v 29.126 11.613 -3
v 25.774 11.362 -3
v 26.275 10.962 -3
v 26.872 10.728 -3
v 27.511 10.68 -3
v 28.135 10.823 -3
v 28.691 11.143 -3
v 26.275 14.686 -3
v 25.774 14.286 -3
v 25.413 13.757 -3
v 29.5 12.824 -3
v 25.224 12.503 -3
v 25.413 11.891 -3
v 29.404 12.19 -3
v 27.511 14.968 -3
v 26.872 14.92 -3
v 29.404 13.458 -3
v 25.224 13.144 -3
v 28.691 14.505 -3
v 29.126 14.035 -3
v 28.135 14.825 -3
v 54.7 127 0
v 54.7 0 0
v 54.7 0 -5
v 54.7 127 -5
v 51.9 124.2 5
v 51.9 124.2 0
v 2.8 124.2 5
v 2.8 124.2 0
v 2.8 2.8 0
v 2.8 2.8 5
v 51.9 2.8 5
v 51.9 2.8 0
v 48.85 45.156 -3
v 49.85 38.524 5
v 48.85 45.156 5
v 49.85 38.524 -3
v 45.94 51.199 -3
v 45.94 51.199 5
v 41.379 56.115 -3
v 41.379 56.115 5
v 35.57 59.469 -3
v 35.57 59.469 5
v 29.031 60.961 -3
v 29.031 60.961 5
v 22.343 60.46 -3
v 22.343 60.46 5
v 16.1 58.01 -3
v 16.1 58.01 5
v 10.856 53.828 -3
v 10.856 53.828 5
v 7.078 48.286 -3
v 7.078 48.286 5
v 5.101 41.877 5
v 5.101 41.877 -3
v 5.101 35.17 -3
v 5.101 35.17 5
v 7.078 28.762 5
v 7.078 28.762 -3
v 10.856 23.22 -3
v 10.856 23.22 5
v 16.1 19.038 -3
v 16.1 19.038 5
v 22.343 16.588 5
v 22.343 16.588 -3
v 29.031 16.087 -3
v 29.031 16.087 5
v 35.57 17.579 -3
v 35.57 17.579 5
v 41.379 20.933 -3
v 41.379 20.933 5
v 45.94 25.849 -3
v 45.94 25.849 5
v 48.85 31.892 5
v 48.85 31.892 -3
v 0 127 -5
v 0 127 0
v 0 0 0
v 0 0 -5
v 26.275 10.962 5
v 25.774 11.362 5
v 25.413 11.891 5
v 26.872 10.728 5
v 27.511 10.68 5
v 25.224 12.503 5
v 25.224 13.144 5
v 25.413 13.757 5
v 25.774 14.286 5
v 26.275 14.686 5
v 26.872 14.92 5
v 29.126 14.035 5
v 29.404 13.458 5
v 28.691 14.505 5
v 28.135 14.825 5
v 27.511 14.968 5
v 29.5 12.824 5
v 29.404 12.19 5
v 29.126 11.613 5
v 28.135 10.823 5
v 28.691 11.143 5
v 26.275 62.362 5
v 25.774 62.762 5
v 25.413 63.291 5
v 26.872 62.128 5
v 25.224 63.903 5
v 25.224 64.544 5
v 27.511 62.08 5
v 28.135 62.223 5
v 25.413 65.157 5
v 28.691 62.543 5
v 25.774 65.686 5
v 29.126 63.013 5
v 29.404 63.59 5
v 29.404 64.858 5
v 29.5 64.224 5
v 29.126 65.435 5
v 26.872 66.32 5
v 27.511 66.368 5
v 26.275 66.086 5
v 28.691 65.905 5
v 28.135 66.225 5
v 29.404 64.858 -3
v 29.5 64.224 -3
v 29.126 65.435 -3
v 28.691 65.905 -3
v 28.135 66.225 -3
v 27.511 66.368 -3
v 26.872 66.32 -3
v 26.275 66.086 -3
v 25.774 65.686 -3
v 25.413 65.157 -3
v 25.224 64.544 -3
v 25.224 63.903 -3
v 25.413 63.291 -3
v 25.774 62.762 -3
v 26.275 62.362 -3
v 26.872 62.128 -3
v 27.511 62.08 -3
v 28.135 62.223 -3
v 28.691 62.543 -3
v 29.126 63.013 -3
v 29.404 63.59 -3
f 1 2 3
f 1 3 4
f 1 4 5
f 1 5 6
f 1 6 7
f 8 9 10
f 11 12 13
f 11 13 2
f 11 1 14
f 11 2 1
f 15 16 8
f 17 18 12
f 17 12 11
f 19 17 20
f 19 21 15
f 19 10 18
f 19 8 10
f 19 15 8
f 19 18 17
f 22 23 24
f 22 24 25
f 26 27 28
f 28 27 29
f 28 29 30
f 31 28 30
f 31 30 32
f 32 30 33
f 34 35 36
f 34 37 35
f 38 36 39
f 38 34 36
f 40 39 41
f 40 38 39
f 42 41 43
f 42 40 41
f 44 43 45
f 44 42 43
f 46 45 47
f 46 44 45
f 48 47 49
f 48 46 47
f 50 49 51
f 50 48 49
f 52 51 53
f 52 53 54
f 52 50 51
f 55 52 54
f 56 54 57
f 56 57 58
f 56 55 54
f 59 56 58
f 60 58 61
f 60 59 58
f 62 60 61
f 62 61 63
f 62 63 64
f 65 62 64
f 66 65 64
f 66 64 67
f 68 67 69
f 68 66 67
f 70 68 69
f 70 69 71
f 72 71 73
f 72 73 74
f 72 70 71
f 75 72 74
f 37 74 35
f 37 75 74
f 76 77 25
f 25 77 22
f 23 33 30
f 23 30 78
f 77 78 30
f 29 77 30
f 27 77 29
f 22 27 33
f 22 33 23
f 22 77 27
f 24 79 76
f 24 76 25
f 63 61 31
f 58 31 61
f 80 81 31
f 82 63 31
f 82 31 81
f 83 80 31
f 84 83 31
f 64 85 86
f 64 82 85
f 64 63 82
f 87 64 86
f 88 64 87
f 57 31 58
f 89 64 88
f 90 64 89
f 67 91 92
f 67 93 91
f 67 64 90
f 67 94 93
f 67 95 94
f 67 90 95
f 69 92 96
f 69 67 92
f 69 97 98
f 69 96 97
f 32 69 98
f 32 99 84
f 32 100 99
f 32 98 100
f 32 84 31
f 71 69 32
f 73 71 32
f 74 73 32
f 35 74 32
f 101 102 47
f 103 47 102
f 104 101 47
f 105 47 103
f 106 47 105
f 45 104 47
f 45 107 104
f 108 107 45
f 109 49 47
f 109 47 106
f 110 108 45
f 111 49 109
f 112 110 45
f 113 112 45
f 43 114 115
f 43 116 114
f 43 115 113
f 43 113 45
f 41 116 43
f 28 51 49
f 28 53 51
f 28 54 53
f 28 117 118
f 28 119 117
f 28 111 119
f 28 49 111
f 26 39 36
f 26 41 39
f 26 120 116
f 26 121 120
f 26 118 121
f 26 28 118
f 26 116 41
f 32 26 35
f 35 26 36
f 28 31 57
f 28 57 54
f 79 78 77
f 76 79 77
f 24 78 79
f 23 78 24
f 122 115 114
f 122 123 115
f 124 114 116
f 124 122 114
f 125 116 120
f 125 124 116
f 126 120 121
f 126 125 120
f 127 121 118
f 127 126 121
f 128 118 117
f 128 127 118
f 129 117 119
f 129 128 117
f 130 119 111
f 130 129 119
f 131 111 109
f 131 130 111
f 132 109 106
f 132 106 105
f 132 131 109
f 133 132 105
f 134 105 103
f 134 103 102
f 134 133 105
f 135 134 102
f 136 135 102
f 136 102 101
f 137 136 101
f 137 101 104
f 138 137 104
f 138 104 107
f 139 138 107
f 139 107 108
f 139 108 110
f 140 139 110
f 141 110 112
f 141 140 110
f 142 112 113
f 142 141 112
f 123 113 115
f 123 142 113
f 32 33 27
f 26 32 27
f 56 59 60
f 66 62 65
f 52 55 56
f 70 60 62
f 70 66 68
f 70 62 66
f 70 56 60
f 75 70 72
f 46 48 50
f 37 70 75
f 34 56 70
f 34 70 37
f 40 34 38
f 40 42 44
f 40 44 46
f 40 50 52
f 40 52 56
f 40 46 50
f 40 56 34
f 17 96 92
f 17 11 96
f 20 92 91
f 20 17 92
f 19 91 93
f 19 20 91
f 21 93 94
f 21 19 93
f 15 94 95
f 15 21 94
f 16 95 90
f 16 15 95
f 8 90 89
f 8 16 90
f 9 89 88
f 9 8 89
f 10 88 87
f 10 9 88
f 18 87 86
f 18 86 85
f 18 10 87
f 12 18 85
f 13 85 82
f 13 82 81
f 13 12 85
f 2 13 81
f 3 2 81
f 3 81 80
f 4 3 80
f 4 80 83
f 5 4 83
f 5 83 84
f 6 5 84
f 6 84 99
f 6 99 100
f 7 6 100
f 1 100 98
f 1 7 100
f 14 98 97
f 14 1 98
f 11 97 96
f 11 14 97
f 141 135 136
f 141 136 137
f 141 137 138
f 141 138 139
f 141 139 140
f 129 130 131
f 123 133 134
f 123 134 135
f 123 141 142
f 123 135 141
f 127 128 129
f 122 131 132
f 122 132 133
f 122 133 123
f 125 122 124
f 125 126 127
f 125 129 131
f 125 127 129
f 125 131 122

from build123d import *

# Parameters (mm, degrees)
SKETCH_W      = 54.7
SKETCH_H      = 127
PAD_DEPTH     = 5
SKETCH001_R   = 2.15
SKETCH001_R_2 = 22.5
PAD001_DEPTH  = 5
SKETCH002_R   = 2.15
SKETCH002_R_2 = 22.5
POCKET_DEPTH  = 3


with BuildPart() as part:
    # Sketch → Pad (new body)
    with BuildSketch(Plane.XY):
        with Locations((27.35, 63.5)):
            Rectangle(SKETCH_W, SKETCH_H)
    extrude(amount=-PAD_DEPTH)

    # Sketch001 → Pad001 (join)
    with BuildSketch(Plane.XY):
        Polygon((2.8, 2.8), (51.9, 2.8), (51.9, 74.2), (51.9, 124.2), (2.8, 124.2), (2.8, 74.2), align=None)
        with Locations((27.35, 12.823933)):
            Circle(SKETCH001_R, mode=Mode.SUBTRACT)
        with Locations((27.35, 64.223933)):
            Circle(SKETCH001_R, mode=Mode.SUBTRACT)
        with Locations((27.35, 38.523933)):
            Circle(SKETCH001_R_2, mode=Mode.SUBTRACT)
    extrude(amount=PAD001_DEPTH)

    # Sketch002 → Pocket (cut)
    with BuildSketch(Plane.XY):
        with Locations((27.35, 12.823933)):
            Circle(SKETCH002_R)
        with Locations((27.35, 64.223933)):
            Circle(SKETCH002_R)
        with Locations((27.35, 38.523933)):
            Circle(SKETCH002_R_2)
    extrude(amount=-POCKET_DEPTH, mode=Mode.SUBTRACT)


solid = part.part
